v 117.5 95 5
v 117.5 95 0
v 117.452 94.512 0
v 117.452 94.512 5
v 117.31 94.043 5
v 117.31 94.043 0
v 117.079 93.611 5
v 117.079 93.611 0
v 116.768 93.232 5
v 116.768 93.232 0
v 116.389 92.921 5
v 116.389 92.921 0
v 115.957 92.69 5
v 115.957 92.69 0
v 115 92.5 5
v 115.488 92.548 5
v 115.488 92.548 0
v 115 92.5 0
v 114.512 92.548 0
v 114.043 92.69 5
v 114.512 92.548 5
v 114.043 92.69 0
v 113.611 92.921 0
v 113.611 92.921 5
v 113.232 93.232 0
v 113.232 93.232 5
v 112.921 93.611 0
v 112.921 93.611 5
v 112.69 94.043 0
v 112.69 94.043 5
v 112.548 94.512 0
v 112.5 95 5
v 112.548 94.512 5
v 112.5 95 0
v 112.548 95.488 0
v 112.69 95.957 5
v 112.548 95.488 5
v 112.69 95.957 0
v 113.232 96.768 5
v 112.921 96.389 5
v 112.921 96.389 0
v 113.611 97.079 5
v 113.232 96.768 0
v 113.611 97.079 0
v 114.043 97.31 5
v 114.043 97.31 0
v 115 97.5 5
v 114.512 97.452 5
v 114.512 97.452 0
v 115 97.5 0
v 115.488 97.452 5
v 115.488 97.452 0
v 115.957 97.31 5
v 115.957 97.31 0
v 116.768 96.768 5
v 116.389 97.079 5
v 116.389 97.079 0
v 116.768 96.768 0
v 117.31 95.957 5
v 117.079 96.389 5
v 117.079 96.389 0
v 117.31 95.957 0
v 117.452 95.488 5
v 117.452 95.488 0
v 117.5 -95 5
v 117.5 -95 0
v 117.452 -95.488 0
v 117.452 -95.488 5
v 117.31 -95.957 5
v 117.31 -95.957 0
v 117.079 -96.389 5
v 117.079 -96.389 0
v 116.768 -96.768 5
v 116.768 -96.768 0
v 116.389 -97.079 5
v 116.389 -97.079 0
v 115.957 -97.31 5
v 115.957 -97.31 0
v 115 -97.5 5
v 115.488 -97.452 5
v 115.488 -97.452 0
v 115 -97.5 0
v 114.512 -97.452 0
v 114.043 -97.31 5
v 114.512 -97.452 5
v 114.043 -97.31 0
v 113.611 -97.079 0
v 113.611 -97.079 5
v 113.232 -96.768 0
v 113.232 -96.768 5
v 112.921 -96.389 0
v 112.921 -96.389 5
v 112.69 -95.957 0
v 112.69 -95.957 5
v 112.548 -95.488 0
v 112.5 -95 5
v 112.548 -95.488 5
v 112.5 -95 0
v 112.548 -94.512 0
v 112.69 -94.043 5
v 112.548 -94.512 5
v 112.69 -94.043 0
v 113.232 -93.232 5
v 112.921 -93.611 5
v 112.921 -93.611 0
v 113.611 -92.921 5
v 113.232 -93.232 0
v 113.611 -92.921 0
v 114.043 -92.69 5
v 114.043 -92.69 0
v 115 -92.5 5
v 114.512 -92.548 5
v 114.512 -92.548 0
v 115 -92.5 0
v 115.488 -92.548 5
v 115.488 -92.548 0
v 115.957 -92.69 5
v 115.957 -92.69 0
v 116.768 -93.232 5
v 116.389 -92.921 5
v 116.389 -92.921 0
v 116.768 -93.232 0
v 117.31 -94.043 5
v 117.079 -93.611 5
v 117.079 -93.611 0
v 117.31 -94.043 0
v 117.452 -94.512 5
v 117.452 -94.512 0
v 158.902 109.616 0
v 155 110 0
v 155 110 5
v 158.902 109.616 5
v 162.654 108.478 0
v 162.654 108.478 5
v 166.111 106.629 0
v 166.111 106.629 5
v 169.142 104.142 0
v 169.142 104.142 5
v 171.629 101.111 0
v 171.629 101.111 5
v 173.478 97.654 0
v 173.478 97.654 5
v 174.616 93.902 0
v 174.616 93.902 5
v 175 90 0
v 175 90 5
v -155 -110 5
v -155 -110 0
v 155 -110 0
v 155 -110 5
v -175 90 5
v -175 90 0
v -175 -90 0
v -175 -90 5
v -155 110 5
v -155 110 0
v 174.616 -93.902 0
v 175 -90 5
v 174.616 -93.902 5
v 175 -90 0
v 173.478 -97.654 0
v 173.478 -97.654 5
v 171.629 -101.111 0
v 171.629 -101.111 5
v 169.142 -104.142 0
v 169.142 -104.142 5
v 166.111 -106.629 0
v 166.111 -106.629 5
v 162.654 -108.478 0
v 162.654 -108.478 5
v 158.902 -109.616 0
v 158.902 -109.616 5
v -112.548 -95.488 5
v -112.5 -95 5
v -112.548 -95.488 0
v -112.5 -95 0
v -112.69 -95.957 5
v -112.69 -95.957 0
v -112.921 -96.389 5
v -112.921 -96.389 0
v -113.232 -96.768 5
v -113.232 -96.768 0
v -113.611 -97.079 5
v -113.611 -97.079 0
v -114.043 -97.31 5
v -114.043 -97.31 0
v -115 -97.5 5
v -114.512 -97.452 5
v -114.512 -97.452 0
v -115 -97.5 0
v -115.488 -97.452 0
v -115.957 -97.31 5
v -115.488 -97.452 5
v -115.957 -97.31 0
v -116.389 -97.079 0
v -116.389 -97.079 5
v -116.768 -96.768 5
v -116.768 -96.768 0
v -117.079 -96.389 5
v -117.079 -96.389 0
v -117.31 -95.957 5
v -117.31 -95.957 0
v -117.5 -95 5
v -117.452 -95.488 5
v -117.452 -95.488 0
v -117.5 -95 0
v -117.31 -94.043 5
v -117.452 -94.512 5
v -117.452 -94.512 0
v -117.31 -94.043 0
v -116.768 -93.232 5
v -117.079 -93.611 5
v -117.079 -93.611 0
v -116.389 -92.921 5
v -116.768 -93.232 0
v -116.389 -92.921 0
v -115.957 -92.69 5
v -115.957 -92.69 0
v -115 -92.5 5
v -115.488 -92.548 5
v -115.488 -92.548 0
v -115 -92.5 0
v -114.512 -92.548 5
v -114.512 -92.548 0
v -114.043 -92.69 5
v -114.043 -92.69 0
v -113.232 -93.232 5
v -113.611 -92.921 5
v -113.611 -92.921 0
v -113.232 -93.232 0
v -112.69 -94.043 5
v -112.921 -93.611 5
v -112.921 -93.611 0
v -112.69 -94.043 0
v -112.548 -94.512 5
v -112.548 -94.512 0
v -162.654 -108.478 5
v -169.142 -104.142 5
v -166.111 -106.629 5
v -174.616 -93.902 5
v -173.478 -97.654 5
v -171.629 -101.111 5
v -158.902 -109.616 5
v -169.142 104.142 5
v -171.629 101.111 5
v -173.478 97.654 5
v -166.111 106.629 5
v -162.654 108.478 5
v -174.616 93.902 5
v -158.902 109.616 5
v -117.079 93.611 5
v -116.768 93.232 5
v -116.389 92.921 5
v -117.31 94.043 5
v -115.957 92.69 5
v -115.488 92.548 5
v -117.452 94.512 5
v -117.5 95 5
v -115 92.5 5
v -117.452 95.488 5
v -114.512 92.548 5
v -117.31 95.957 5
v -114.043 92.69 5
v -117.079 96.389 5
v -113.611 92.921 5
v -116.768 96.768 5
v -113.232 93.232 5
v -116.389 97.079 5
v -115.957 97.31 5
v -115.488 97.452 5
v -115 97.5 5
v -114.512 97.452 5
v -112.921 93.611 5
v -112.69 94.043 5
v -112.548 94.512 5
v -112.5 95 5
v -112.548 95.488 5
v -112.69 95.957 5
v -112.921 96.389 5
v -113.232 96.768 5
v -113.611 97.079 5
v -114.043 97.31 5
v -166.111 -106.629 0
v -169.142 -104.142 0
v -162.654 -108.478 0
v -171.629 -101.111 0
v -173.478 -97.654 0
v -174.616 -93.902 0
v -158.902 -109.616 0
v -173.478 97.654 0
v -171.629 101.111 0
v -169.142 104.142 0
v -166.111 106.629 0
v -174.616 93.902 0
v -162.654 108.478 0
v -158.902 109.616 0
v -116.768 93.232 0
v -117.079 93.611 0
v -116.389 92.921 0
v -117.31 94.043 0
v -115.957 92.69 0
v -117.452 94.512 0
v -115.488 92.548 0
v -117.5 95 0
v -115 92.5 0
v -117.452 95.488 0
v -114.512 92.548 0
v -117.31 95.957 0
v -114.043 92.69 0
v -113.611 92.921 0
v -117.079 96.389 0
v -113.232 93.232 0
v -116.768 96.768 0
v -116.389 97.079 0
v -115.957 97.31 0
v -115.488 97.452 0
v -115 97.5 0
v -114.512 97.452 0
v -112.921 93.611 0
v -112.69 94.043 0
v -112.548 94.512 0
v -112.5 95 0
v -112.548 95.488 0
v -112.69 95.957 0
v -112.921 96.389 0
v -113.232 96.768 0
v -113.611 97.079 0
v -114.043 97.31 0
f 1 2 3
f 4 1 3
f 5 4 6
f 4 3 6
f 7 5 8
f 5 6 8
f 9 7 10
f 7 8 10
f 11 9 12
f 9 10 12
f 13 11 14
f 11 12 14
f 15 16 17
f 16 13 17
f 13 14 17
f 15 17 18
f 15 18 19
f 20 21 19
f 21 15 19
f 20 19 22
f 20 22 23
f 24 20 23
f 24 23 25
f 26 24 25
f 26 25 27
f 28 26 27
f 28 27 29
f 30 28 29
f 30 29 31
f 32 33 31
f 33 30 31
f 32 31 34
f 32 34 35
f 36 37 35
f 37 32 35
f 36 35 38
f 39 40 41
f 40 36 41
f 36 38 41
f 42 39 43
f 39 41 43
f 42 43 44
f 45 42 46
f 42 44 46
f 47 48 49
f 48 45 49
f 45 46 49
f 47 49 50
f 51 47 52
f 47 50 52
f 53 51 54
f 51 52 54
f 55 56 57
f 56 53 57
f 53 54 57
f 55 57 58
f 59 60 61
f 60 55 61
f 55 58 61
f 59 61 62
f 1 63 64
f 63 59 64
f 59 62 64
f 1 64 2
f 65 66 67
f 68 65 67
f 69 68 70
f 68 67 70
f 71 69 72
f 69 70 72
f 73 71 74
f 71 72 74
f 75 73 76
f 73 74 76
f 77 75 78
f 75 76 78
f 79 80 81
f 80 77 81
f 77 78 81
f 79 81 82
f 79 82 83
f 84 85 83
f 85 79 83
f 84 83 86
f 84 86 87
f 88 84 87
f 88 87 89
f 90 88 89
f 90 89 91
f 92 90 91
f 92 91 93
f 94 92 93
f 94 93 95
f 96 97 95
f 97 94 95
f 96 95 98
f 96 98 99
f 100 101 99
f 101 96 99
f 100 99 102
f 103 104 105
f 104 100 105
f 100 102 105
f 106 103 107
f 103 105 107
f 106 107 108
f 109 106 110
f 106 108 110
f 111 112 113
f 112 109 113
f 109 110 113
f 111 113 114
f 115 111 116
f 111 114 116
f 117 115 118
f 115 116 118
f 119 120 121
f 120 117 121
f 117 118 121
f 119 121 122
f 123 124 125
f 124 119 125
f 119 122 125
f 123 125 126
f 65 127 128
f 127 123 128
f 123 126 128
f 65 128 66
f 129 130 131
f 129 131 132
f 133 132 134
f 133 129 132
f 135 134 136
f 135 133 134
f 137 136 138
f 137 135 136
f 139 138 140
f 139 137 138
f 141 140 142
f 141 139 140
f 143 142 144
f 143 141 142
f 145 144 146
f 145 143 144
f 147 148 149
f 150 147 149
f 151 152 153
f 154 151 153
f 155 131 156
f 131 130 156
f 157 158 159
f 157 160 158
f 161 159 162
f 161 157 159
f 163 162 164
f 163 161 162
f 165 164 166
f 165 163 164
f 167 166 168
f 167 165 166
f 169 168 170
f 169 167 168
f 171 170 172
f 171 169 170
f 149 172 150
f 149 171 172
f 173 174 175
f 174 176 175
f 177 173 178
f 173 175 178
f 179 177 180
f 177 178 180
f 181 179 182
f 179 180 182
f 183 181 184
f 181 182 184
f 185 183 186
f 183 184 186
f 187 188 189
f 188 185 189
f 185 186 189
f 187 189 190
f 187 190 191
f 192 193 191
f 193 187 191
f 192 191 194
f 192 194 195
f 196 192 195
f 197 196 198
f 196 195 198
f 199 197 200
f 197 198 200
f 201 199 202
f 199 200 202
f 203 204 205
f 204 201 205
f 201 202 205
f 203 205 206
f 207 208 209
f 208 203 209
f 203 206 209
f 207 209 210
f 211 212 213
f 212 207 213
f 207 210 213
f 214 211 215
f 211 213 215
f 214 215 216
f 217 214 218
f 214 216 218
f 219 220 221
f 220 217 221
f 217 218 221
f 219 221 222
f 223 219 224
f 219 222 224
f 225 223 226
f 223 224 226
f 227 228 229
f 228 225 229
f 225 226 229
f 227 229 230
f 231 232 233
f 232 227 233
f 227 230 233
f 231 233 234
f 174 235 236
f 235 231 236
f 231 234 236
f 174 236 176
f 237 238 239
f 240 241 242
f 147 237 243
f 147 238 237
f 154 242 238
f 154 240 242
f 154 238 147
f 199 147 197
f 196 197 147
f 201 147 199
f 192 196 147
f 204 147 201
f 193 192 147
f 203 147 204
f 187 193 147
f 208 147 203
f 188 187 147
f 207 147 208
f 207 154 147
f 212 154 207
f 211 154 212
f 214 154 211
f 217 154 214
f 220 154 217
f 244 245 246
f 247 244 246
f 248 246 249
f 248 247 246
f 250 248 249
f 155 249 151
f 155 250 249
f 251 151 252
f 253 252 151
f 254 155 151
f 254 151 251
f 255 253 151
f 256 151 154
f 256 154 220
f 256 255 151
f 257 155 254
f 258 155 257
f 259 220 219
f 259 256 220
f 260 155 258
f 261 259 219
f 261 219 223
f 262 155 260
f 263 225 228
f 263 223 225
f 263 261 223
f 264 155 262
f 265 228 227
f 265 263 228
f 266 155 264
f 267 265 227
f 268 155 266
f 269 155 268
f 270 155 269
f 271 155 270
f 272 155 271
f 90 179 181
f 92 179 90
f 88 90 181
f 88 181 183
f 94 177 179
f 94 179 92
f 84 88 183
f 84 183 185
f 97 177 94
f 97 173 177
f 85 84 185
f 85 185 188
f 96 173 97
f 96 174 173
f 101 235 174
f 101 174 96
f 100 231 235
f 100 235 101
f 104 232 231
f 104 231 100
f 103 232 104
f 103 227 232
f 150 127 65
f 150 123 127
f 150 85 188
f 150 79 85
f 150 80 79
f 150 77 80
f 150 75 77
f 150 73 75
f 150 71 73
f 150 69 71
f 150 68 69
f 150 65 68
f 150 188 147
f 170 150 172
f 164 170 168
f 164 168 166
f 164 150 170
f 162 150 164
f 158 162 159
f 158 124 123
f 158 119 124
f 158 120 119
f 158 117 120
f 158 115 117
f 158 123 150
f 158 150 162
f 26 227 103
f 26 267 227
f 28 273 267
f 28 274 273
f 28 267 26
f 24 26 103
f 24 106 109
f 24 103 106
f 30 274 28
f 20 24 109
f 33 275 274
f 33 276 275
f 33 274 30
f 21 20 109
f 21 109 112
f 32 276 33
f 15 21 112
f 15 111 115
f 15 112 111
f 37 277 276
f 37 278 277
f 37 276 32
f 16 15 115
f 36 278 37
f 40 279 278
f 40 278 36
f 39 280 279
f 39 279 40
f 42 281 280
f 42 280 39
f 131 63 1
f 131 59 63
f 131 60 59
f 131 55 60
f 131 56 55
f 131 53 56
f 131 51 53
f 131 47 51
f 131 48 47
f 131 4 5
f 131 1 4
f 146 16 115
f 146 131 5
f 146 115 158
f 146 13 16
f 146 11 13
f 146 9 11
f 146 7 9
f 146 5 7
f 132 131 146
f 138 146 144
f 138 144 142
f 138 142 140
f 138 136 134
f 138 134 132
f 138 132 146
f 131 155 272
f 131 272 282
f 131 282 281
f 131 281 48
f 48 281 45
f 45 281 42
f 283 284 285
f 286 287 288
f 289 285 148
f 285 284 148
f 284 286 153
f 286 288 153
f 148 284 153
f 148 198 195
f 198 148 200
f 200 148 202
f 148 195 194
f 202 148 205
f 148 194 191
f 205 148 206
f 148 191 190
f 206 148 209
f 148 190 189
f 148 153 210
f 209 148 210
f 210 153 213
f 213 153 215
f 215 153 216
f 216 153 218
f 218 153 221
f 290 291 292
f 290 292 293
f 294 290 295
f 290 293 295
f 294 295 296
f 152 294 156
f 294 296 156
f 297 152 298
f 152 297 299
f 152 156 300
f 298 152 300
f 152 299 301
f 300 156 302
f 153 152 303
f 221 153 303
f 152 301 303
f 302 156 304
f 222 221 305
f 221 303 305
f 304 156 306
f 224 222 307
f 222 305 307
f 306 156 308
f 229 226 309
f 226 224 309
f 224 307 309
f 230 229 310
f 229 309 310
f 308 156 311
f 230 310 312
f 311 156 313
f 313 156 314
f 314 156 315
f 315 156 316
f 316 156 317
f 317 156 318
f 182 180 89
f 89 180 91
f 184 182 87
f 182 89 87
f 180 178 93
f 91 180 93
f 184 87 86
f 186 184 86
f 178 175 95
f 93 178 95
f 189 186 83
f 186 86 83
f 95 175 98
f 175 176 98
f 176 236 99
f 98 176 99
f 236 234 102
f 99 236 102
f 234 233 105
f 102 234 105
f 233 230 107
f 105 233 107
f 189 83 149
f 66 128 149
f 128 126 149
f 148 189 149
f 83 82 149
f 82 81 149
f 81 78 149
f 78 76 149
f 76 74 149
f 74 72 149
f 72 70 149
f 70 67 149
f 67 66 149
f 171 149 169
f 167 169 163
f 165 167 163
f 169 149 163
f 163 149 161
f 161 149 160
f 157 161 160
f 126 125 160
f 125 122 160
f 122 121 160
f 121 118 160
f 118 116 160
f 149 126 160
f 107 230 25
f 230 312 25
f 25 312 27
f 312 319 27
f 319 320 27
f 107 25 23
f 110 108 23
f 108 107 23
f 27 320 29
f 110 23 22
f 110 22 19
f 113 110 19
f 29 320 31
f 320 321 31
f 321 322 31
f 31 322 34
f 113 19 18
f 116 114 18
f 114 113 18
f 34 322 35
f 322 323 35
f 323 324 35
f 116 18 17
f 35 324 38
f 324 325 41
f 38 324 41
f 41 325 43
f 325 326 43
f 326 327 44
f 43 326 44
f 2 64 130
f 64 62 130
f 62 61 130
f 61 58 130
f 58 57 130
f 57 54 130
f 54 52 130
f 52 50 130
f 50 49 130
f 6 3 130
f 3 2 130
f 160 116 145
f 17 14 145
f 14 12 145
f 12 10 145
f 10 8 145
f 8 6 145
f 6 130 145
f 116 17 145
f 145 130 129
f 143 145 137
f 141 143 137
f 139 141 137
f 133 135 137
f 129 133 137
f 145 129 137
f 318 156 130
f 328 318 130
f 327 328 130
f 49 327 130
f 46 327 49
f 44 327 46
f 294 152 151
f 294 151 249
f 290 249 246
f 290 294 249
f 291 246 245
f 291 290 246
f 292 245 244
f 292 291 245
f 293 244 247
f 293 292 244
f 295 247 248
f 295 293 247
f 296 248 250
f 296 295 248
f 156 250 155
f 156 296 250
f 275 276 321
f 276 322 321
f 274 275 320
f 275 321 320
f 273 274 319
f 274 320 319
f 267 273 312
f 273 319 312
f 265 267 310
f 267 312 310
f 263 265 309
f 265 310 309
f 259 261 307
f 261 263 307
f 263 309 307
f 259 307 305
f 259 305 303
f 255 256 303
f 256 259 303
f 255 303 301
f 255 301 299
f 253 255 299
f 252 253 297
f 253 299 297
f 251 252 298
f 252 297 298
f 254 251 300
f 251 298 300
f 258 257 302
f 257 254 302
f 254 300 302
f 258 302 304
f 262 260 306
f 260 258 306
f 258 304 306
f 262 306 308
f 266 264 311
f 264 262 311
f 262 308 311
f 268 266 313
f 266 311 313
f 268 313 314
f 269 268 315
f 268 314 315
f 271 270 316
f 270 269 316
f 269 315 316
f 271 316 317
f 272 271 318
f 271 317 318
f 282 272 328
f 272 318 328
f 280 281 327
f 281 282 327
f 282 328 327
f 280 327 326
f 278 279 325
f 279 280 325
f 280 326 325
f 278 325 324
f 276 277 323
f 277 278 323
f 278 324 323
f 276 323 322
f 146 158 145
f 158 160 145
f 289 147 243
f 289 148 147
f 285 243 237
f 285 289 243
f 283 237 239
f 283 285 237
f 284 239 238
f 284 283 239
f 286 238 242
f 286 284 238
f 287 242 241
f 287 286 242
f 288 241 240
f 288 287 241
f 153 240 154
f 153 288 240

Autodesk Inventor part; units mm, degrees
ref_plane "YZ Plane" through (0, 0, 0) normal (1, 0, 0) x (0, 1, 0)
ref_plane "XZ Plane" through (0, 0, 0) normal (0, 1, 0) x (-1, 0, 0)
ref_plane "XY Plane" through (0, 0, 0) normal (0, 0, 1) x (1, 0, 0)
sketch "スケッチ1" plane through (0, 0, 0) normal (0, 0, 1) x (1, 0, 0)
  line L0 (-155, -110) -> (155, -110)
  line L1 (175, -90) -> (175, 90)
  line L2 (155, 110) -> (-155, 110)
  line L3 (-175, 90) -> (-175, -90)
  line L4 (-175, -110) -> (175, 110) construction
  line L5 (175, -110) -> (-175, 110) construction
  arc A0 (175, 90) -> (155, 110) centre (155, 90) ccw
  arc A1 (155, -110) -> (175, -90) centre (155, -90) ccw
  arc A2 (-175, -90) -> (-155, -110) centre (-155, -90) ccw
  arc A3 (-155, 110) -> (-175, 90) centre (-155, 90) ccw
  circle A4 centre (115, -95) radius 2.5
  circle A5 centre (-115, -95) radius 2.5
  circle A6 centre (115, 95) radius 2.5
  circle A7 centre (-115, 95) radius 2.5
  point P0 (0, 0)
  dimension "d0" = 350
  dimension "d1" = 220
  dimension "d2" = 20
  dimension "d3" = 20
  dimension "d4" = 20
  dimension "d5" = 20
  dimension "d6" = 5
  dimension "d7" = 15
  dimension "d8" = 60
  dimension "d9" = 15
  dimension "d10" = 60
  dimension "d11" = 15
  dimension "d12" = 60
  dimension "d13" = 15
  dimension "d14" = 60
sketch "スケッチ2" plane through (0, 0, 0) normal (0, 0, 1) x (1, 0, 0)
  point P0 (0, 0)
sketch "スケッチ3" plane through (0, 0, 0) normal (0, 0, 1) x (1, 0, 0)
  point P0 (0, 0)
extrude "押し出し1" add sketch "スケッチ1" along normal blind 5
properties part number "TopBoard"
